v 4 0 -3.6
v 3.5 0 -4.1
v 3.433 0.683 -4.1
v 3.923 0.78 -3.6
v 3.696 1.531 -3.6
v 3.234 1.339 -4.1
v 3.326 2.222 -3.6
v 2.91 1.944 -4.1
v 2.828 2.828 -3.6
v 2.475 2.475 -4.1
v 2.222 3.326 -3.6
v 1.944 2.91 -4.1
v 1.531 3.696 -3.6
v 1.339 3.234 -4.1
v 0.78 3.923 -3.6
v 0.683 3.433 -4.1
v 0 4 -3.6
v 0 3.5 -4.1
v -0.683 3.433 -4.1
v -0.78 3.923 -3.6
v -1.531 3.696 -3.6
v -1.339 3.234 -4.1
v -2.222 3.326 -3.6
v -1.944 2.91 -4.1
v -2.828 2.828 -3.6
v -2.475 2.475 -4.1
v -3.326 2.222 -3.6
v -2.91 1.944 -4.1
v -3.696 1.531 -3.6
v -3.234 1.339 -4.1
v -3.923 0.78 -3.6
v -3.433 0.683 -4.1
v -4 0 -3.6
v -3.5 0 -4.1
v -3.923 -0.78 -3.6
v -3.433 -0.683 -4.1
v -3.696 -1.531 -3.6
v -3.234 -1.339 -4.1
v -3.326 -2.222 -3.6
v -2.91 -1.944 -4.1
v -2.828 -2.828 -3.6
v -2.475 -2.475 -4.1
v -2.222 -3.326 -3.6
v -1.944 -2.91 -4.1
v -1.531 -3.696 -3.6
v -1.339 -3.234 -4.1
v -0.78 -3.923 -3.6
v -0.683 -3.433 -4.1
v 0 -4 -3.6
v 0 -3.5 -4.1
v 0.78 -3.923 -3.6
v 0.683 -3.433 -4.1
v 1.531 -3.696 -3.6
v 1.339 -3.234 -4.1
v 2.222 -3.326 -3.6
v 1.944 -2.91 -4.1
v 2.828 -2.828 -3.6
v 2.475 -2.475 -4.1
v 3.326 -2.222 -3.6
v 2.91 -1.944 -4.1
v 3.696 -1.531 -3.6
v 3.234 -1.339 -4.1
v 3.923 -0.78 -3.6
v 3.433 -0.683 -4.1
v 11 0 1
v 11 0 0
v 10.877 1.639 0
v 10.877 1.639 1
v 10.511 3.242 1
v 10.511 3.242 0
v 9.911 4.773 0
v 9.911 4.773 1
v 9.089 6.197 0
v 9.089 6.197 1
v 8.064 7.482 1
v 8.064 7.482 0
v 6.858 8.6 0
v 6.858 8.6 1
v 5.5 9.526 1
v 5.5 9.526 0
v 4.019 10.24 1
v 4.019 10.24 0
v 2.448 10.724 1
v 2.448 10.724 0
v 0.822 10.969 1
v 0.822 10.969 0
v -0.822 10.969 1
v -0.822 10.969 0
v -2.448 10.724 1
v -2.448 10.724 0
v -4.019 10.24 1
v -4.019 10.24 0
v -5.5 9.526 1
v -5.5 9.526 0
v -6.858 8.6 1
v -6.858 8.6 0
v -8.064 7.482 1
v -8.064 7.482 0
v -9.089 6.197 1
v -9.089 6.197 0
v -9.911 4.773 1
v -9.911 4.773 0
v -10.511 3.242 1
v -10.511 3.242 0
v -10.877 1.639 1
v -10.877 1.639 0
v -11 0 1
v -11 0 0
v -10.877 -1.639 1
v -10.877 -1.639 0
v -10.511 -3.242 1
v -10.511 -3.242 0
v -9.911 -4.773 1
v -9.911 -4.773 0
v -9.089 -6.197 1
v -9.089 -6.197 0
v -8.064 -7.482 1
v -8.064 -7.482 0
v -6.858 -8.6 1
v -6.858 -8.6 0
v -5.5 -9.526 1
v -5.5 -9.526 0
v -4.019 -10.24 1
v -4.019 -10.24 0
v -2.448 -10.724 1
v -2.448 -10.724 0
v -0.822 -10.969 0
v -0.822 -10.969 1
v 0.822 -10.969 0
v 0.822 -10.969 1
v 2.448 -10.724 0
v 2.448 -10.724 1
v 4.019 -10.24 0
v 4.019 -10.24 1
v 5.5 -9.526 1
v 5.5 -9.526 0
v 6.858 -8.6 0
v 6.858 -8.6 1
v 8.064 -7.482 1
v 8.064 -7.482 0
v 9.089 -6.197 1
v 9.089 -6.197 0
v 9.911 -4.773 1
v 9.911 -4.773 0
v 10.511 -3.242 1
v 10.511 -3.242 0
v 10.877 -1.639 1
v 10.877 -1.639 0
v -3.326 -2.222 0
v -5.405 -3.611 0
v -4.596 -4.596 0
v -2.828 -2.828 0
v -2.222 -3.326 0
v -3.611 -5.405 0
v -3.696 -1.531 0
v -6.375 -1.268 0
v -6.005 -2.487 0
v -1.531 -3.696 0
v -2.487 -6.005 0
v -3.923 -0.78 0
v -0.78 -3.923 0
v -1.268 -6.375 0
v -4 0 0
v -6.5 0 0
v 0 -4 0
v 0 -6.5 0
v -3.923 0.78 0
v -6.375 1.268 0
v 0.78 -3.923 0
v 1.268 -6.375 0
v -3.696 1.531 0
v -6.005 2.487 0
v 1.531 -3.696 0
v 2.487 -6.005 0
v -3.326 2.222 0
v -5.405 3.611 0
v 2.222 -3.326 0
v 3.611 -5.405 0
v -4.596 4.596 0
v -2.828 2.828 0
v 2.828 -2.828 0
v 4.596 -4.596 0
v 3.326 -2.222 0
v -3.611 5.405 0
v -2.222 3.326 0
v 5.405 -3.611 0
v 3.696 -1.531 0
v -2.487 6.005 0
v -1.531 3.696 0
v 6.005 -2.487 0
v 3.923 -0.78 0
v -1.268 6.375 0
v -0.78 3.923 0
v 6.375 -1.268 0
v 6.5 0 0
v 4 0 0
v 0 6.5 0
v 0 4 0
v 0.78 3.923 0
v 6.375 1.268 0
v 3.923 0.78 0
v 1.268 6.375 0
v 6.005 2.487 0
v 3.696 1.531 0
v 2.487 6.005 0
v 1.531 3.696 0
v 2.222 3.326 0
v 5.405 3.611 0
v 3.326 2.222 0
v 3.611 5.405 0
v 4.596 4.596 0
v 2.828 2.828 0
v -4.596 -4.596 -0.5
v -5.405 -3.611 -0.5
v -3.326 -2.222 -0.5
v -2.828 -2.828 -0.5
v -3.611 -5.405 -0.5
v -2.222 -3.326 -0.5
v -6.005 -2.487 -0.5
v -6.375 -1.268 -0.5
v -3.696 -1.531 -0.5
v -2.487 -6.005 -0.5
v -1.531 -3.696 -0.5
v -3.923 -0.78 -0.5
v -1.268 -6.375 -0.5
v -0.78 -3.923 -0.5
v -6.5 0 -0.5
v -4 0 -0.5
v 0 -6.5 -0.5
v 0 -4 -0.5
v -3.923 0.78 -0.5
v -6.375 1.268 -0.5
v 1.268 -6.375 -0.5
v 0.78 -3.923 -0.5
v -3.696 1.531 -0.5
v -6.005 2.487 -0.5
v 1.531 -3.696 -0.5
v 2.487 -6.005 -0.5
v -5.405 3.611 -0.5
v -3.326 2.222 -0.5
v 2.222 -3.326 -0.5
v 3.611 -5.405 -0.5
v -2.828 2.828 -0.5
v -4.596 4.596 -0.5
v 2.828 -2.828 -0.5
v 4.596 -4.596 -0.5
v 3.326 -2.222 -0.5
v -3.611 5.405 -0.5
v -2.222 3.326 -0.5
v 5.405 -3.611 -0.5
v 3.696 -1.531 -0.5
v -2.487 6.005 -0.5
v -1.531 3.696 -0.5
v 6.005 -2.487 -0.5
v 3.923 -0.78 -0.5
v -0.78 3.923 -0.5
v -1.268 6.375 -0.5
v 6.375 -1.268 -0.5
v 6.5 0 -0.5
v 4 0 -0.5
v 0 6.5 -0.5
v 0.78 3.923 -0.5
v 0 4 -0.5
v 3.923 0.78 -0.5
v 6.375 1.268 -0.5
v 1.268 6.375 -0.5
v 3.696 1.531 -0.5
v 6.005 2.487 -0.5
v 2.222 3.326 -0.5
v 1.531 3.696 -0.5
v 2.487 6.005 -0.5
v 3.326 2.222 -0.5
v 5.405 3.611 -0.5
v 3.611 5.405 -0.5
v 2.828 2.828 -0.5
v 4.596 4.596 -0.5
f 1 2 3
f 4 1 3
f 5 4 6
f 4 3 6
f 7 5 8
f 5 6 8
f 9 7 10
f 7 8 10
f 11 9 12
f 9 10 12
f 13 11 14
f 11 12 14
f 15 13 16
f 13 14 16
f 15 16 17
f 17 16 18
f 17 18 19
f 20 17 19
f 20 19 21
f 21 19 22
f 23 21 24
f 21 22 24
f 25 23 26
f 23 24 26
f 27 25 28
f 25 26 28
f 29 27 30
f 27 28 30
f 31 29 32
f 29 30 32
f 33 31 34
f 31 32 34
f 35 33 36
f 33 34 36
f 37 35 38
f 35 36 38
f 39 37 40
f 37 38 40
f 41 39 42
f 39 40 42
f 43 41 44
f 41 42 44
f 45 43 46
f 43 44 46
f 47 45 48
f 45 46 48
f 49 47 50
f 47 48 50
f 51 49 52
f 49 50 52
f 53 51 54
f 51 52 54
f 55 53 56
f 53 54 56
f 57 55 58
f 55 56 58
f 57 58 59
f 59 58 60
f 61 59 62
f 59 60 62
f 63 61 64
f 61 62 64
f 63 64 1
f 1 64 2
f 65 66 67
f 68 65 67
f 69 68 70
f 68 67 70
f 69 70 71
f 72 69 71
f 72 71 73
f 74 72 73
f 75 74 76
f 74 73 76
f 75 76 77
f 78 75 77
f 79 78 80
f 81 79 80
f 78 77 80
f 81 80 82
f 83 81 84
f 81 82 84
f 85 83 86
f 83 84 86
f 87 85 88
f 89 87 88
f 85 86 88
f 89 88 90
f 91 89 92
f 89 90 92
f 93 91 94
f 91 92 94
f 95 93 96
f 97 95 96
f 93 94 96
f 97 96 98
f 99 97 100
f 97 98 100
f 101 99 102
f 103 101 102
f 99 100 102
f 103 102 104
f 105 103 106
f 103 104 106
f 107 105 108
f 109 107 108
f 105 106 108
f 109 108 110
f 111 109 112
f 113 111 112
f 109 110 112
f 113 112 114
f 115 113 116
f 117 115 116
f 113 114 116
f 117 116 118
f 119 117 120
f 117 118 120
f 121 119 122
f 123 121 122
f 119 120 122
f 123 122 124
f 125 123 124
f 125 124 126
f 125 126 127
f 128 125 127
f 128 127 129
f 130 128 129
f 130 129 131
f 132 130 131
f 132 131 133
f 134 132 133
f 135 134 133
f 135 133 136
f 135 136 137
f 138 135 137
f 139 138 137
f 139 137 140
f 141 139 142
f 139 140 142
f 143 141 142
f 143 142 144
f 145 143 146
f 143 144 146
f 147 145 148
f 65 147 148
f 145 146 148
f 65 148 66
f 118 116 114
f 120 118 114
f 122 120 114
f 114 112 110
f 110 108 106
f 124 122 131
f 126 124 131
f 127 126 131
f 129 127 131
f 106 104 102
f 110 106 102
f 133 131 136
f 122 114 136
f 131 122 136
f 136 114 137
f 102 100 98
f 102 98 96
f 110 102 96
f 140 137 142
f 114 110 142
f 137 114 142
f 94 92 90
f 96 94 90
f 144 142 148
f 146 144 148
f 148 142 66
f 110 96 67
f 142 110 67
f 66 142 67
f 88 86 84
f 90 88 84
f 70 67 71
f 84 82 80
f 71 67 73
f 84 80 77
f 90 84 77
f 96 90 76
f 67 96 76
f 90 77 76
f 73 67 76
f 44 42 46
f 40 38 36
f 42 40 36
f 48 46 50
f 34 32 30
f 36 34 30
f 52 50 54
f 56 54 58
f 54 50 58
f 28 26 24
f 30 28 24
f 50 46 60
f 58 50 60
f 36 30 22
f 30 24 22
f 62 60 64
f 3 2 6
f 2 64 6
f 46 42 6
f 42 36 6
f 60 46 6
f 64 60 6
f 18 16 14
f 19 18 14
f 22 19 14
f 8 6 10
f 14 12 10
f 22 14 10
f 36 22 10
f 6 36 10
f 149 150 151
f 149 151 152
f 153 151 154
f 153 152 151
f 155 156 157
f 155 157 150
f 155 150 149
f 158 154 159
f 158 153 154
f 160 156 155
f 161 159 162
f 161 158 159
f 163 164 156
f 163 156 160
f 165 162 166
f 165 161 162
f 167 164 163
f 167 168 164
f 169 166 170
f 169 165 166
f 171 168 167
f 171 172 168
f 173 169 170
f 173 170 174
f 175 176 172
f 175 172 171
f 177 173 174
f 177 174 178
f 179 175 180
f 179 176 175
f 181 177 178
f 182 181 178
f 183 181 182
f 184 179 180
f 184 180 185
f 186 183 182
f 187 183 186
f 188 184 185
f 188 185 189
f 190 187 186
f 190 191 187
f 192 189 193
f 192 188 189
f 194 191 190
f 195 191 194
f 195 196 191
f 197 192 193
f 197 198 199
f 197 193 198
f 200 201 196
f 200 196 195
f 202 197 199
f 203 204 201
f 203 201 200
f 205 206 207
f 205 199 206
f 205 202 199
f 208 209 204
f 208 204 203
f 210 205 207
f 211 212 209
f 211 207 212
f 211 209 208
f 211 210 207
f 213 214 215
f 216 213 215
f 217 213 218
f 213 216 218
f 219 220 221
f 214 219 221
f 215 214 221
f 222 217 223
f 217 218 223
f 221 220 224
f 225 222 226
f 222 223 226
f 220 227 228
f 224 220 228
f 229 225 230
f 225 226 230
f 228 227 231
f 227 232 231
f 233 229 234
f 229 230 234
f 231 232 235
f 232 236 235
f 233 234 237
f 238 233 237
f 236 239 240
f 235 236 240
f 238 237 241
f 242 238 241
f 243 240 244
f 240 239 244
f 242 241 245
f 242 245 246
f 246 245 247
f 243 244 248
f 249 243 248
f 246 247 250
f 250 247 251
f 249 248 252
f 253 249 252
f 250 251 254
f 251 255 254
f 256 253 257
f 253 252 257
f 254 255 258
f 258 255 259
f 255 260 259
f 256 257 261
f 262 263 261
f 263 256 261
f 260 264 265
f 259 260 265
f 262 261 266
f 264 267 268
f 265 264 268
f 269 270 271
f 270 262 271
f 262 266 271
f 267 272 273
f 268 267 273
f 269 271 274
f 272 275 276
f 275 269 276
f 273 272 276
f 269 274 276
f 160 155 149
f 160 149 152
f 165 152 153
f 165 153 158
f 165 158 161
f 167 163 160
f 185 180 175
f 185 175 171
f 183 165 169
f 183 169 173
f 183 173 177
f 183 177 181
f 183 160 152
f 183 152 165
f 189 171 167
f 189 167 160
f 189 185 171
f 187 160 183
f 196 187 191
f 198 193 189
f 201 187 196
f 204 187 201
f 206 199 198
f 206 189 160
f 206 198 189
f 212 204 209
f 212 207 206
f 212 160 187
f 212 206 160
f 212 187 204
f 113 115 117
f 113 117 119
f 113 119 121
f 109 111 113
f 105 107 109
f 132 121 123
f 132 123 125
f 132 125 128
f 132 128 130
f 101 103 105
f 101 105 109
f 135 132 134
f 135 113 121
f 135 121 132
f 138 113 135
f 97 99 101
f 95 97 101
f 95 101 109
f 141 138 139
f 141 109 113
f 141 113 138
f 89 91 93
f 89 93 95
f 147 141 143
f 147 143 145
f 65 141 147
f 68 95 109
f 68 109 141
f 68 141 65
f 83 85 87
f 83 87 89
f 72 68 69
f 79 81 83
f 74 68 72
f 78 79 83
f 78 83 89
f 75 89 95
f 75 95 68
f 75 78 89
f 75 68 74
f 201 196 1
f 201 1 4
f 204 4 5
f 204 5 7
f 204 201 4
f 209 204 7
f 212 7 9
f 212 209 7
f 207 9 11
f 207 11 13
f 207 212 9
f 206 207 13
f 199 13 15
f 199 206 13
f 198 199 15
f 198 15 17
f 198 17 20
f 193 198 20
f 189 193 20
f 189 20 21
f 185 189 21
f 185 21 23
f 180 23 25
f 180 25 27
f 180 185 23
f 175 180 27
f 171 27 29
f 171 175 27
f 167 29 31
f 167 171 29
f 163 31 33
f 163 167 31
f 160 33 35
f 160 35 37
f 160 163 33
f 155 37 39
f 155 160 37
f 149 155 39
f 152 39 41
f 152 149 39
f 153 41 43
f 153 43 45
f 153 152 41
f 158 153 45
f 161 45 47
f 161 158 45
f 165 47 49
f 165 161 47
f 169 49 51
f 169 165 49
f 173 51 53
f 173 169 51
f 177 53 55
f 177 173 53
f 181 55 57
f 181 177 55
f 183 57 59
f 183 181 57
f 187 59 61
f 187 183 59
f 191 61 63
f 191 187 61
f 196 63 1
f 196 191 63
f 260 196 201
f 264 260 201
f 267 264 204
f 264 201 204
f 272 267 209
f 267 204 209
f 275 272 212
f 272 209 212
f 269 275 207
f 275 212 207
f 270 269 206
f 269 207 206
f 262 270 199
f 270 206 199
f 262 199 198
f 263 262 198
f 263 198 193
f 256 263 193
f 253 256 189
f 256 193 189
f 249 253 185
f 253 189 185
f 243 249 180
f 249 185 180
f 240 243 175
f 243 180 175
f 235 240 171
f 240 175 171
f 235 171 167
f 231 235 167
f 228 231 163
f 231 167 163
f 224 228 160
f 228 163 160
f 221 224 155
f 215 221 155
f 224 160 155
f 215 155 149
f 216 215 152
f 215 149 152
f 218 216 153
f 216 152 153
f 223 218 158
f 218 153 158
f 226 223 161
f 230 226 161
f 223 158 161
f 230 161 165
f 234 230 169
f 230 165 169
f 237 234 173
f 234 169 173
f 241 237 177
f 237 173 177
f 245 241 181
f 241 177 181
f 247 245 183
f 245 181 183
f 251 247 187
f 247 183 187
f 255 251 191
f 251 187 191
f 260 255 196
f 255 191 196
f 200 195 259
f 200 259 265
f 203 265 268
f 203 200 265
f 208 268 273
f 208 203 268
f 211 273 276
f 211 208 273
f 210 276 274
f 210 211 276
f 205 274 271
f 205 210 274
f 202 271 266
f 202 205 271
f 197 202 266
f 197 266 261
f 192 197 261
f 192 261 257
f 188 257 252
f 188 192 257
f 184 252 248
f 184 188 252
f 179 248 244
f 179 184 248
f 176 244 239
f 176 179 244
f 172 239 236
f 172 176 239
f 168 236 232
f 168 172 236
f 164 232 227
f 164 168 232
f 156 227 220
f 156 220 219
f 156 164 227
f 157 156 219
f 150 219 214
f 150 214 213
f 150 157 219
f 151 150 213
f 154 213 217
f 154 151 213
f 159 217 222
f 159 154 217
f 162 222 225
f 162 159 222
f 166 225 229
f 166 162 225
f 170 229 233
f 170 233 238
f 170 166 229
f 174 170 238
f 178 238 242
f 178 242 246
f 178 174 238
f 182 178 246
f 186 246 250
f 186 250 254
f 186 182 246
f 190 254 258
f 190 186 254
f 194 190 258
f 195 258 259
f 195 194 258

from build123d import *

# Parameters (mm, degrees)
F0_R     = 4
F1_DEPTH = 4.1
F0_R_2   = 6.5
F2_DEPTH = 0.5
F0_R_3   = 11
F3_DEPTH = 1
F4_SIZE  = 0.5


with BuildPart() as f1:
    # F0 (on Top) → F1 (new body)
    with BuildSketch(Plane.XY):
        Circle(F0_R)
    extrude(amount=-F1_DEPTH)

    # F4
    f4_edges = [f1.edges().sort_by_distance(p)[0] for p in [
        (-4, 0, -4.1),
    ]]
    chamfer(f4_edges, length=F4_SIZE)


with BuildPart() as f2:
    # F0 (on Top) → F2 (new body)
    with BuildSketch(Plane.XY):
        Circle(F0_R_2)
        Circle(F0_R, mode=Mode.SUBTRACT)
    extrude(amount=-F2_DEPTH)


with BuildPart() as f3:
    # F0 (on Top) → F3 (new body)
    with BuildSketch(Plane.XY):
        Circle(F0_R_3)
        Circle(F0_R_2, mode=Mode.SUBTRACT)
        Circle(F0_R_2)
        Circle(F0_R, mode=Mode.SUBTRACT)
        Circle(F0_R)
    extrude(amount=F3_DEPTH)


solid = Compound([f1.part, f2.part, f3.part])
